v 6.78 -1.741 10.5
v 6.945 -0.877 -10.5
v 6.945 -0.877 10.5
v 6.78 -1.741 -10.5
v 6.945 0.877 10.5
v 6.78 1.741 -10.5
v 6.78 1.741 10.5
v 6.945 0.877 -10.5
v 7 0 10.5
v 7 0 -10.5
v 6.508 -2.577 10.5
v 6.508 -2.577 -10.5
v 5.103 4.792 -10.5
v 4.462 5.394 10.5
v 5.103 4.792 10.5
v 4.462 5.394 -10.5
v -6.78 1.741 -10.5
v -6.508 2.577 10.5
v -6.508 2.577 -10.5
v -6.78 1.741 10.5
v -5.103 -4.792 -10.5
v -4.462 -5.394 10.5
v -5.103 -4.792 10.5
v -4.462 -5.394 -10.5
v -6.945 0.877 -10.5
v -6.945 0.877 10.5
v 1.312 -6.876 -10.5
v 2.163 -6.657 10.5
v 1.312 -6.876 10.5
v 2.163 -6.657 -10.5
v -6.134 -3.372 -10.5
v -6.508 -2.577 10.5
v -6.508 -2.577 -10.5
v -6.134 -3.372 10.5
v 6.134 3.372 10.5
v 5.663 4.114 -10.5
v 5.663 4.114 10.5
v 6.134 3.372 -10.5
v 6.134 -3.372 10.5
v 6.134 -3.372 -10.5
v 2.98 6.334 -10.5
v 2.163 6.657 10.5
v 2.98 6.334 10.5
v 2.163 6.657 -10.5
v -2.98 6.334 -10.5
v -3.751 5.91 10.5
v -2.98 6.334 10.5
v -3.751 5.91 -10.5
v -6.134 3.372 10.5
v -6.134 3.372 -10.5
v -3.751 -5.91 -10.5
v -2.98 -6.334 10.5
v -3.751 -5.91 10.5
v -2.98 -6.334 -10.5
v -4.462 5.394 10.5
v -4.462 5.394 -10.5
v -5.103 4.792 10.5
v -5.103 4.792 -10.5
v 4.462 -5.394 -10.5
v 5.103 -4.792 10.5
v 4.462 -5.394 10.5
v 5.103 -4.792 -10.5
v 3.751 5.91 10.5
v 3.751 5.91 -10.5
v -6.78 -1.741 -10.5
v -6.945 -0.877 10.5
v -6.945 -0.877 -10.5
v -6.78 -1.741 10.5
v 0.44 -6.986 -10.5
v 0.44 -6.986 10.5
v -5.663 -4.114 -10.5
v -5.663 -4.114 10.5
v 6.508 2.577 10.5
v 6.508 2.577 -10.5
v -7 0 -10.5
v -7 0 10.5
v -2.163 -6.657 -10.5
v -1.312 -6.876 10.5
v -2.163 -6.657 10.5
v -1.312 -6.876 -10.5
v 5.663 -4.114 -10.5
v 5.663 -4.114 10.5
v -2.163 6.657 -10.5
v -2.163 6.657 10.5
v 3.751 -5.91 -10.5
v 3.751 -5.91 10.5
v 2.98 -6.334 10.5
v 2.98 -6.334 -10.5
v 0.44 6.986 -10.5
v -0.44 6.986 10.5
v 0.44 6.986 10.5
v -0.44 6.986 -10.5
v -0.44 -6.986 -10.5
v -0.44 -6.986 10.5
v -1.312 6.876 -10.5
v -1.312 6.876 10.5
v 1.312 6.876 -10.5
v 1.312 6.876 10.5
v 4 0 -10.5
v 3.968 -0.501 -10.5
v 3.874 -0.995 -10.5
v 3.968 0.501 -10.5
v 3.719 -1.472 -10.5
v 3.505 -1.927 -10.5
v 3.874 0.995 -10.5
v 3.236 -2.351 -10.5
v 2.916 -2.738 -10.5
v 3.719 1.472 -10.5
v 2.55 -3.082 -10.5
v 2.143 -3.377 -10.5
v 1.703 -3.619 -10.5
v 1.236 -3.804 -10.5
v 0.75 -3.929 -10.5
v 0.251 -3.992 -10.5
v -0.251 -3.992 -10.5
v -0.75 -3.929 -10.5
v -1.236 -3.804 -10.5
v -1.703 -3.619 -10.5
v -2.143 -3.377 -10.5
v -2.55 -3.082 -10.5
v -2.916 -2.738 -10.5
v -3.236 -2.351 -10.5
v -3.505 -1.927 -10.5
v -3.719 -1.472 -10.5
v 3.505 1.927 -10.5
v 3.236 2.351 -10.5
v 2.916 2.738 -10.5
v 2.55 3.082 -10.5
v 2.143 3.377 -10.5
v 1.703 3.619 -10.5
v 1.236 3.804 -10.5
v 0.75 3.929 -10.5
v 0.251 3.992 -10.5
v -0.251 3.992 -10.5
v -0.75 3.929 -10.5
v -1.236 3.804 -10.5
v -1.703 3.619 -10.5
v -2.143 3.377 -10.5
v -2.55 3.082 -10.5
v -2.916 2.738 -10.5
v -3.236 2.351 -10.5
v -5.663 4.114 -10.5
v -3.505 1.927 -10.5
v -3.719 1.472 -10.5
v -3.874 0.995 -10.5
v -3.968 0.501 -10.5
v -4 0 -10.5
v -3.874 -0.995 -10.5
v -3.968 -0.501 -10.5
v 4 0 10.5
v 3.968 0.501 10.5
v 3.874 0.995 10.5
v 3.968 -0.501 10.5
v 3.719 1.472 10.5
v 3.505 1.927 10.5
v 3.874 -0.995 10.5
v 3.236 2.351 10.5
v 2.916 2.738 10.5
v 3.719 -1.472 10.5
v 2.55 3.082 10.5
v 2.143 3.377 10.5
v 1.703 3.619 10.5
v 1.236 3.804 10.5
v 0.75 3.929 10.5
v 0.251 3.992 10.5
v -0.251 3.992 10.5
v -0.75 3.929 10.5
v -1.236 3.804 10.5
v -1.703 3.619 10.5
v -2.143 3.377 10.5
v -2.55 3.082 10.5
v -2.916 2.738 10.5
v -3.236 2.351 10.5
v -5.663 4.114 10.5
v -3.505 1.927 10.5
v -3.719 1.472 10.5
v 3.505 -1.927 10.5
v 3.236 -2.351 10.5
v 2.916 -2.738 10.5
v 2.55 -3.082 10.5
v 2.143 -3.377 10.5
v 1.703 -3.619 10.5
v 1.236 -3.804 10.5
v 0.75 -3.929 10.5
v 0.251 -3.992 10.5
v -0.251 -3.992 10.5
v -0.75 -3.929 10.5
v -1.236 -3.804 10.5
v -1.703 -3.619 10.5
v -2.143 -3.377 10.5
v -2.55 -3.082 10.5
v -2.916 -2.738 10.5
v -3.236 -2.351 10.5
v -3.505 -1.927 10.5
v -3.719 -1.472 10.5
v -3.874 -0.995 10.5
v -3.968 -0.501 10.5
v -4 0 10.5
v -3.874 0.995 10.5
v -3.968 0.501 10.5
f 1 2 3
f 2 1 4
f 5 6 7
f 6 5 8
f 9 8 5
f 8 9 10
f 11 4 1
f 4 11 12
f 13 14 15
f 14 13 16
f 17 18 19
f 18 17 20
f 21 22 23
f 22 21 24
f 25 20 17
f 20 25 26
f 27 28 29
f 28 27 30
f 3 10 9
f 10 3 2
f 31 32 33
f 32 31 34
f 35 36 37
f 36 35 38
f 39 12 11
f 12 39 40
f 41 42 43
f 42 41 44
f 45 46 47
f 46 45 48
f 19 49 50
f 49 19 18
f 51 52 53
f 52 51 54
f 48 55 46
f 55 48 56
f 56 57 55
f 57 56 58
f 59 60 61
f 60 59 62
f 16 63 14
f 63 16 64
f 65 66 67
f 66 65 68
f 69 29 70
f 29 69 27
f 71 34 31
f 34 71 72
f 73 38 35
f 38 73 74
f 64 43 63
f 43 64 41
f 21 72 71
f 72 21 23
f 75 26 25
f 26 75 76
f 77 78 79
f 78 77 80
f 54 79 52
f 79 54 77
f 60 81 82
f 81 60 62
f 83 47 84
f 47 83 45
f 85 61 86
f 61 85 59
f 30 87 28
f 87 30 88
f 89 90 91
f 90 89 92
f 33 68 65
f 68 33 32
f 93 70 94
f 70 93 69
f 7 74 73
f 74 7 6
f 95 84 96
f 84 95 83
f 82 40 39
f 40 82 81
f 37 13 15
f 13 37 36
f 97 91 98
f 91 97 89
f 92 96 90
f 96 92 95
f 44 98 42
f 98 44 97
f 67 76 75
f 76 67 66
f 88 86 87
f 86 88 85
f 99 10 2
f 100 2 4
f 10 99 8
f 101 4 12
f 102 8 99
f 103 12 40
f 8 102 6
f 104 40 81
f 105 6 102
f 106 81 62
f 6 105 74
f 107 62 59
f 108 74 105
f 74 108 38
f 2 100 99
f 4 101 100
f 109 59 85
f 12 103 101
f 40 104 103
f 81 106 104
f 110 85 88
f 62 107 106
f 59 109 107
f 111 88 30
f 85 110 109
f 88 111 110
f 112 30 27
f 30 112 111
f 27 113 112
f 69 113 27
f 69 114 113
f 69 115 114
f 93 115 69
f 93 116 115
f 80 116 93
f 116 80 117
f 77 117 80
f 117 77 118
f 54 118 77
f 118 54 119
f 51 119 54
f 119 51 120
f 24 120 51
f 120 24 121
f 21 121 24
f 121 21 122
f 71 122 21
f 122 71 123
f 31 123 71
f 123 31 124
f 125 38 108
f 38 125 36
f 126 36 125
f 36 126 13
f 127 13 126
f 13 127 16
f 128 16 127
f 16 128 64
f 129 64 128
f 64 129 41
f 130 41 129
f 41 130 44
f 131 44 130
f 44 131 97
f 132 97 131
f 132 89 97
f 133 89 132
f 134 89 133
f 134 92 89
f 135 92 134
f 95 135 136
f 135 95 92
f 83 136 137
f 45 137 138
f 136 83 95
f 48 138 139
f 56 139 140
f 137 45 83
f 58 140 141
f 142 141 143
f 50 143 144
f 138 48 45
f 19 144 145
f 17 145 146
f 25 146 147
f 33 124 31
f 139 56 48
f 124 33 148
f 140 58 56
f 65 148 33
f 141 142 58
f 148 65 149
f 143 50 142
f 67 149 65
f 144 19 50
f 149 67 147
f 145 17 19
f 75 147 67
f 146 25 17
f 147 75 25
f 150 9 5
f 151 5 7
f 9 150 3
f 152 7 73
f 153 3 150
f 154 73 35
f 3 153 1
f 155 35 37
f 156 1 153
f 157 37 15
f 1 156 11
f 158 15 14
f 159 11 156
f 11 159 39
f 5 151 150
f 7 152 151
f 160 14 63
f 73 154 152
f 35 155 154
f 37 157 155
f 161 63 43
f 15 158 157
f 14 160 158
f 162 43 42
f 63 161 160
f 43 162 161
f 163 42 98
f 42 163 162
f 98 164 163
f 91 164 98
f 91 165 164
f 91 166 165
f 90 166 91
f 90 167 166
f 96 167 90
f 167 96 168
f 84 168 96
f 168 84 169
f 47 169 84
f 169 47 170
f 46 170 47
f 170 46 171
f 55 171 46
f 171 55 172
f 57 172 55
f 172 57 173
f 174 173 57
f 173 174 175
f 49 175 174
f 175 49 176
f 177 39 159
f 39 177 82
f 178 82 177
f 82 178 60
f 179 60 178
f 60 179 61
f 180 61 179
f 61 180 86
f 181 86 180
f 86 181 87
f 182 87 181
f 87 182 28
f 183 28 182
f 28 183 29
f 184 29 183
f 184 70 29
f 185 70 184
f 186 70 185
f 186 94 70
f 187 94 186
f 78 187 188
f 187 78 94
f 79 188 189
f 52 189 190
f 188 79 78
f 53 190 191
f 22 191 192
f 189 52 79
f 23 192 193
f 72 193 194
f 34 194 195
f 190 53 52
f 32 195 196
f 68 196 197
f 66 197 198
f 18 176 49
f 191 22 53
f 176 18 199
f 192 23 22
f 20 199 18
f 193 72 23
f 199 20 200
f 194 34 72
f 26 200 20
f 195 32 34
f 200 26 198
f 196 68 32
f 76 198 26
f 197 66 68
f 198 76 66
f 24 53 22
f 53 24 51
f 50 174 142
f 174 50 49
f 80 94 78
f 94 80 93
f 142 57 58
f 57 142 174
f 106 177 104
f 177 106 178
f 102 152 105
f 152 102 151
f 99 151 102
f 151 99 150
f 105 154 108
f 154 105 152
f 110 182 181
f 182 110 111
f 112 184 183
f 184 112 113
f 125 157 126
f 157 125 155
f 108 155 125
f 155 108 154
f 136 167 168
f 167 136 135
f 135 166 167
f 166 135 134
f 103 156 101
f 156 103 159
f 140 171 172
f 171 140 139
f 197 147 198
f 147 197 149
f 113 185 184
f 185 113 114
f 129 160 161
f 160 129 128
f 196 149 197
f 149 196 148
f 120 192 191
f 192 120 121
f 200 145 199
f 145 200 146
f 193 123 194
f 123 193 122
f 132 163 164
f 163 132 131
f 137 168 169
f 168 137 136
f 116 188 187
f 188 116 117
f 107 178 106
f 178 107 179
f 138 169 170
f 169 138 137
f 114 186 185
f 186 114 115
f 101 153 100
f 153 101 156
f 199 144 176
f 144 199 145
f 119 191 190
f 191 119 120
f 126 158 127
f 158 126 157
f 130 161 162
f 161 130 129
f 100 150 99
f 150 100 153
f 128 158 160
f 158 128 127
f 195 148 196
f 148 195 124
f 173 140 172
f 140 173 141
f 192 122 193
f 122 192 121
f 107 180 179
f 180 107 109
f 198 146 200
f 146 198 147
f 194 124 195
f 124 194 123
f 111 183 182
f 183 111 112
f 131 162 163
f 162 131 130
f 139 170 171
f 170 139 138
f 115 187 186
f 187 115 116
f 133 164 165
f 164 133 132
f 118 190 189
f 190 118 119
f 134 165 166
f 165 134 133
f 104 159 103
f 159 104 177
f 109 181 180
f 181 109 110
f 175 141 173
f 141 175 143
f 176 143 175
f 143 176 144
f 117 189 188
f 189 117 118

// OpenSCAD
$fn = 50;


difference() {
	union() {
		translate(v = [0, 0, -10.5000000000]) {
			cylinder(h = 21, r = 7.0000000000);
		}
	}
	union() {
		translate(v = [0, 0, -100.0000000000]) {
			cylinder(h = 200, r = 4.0000000000);
		}
	}
}
